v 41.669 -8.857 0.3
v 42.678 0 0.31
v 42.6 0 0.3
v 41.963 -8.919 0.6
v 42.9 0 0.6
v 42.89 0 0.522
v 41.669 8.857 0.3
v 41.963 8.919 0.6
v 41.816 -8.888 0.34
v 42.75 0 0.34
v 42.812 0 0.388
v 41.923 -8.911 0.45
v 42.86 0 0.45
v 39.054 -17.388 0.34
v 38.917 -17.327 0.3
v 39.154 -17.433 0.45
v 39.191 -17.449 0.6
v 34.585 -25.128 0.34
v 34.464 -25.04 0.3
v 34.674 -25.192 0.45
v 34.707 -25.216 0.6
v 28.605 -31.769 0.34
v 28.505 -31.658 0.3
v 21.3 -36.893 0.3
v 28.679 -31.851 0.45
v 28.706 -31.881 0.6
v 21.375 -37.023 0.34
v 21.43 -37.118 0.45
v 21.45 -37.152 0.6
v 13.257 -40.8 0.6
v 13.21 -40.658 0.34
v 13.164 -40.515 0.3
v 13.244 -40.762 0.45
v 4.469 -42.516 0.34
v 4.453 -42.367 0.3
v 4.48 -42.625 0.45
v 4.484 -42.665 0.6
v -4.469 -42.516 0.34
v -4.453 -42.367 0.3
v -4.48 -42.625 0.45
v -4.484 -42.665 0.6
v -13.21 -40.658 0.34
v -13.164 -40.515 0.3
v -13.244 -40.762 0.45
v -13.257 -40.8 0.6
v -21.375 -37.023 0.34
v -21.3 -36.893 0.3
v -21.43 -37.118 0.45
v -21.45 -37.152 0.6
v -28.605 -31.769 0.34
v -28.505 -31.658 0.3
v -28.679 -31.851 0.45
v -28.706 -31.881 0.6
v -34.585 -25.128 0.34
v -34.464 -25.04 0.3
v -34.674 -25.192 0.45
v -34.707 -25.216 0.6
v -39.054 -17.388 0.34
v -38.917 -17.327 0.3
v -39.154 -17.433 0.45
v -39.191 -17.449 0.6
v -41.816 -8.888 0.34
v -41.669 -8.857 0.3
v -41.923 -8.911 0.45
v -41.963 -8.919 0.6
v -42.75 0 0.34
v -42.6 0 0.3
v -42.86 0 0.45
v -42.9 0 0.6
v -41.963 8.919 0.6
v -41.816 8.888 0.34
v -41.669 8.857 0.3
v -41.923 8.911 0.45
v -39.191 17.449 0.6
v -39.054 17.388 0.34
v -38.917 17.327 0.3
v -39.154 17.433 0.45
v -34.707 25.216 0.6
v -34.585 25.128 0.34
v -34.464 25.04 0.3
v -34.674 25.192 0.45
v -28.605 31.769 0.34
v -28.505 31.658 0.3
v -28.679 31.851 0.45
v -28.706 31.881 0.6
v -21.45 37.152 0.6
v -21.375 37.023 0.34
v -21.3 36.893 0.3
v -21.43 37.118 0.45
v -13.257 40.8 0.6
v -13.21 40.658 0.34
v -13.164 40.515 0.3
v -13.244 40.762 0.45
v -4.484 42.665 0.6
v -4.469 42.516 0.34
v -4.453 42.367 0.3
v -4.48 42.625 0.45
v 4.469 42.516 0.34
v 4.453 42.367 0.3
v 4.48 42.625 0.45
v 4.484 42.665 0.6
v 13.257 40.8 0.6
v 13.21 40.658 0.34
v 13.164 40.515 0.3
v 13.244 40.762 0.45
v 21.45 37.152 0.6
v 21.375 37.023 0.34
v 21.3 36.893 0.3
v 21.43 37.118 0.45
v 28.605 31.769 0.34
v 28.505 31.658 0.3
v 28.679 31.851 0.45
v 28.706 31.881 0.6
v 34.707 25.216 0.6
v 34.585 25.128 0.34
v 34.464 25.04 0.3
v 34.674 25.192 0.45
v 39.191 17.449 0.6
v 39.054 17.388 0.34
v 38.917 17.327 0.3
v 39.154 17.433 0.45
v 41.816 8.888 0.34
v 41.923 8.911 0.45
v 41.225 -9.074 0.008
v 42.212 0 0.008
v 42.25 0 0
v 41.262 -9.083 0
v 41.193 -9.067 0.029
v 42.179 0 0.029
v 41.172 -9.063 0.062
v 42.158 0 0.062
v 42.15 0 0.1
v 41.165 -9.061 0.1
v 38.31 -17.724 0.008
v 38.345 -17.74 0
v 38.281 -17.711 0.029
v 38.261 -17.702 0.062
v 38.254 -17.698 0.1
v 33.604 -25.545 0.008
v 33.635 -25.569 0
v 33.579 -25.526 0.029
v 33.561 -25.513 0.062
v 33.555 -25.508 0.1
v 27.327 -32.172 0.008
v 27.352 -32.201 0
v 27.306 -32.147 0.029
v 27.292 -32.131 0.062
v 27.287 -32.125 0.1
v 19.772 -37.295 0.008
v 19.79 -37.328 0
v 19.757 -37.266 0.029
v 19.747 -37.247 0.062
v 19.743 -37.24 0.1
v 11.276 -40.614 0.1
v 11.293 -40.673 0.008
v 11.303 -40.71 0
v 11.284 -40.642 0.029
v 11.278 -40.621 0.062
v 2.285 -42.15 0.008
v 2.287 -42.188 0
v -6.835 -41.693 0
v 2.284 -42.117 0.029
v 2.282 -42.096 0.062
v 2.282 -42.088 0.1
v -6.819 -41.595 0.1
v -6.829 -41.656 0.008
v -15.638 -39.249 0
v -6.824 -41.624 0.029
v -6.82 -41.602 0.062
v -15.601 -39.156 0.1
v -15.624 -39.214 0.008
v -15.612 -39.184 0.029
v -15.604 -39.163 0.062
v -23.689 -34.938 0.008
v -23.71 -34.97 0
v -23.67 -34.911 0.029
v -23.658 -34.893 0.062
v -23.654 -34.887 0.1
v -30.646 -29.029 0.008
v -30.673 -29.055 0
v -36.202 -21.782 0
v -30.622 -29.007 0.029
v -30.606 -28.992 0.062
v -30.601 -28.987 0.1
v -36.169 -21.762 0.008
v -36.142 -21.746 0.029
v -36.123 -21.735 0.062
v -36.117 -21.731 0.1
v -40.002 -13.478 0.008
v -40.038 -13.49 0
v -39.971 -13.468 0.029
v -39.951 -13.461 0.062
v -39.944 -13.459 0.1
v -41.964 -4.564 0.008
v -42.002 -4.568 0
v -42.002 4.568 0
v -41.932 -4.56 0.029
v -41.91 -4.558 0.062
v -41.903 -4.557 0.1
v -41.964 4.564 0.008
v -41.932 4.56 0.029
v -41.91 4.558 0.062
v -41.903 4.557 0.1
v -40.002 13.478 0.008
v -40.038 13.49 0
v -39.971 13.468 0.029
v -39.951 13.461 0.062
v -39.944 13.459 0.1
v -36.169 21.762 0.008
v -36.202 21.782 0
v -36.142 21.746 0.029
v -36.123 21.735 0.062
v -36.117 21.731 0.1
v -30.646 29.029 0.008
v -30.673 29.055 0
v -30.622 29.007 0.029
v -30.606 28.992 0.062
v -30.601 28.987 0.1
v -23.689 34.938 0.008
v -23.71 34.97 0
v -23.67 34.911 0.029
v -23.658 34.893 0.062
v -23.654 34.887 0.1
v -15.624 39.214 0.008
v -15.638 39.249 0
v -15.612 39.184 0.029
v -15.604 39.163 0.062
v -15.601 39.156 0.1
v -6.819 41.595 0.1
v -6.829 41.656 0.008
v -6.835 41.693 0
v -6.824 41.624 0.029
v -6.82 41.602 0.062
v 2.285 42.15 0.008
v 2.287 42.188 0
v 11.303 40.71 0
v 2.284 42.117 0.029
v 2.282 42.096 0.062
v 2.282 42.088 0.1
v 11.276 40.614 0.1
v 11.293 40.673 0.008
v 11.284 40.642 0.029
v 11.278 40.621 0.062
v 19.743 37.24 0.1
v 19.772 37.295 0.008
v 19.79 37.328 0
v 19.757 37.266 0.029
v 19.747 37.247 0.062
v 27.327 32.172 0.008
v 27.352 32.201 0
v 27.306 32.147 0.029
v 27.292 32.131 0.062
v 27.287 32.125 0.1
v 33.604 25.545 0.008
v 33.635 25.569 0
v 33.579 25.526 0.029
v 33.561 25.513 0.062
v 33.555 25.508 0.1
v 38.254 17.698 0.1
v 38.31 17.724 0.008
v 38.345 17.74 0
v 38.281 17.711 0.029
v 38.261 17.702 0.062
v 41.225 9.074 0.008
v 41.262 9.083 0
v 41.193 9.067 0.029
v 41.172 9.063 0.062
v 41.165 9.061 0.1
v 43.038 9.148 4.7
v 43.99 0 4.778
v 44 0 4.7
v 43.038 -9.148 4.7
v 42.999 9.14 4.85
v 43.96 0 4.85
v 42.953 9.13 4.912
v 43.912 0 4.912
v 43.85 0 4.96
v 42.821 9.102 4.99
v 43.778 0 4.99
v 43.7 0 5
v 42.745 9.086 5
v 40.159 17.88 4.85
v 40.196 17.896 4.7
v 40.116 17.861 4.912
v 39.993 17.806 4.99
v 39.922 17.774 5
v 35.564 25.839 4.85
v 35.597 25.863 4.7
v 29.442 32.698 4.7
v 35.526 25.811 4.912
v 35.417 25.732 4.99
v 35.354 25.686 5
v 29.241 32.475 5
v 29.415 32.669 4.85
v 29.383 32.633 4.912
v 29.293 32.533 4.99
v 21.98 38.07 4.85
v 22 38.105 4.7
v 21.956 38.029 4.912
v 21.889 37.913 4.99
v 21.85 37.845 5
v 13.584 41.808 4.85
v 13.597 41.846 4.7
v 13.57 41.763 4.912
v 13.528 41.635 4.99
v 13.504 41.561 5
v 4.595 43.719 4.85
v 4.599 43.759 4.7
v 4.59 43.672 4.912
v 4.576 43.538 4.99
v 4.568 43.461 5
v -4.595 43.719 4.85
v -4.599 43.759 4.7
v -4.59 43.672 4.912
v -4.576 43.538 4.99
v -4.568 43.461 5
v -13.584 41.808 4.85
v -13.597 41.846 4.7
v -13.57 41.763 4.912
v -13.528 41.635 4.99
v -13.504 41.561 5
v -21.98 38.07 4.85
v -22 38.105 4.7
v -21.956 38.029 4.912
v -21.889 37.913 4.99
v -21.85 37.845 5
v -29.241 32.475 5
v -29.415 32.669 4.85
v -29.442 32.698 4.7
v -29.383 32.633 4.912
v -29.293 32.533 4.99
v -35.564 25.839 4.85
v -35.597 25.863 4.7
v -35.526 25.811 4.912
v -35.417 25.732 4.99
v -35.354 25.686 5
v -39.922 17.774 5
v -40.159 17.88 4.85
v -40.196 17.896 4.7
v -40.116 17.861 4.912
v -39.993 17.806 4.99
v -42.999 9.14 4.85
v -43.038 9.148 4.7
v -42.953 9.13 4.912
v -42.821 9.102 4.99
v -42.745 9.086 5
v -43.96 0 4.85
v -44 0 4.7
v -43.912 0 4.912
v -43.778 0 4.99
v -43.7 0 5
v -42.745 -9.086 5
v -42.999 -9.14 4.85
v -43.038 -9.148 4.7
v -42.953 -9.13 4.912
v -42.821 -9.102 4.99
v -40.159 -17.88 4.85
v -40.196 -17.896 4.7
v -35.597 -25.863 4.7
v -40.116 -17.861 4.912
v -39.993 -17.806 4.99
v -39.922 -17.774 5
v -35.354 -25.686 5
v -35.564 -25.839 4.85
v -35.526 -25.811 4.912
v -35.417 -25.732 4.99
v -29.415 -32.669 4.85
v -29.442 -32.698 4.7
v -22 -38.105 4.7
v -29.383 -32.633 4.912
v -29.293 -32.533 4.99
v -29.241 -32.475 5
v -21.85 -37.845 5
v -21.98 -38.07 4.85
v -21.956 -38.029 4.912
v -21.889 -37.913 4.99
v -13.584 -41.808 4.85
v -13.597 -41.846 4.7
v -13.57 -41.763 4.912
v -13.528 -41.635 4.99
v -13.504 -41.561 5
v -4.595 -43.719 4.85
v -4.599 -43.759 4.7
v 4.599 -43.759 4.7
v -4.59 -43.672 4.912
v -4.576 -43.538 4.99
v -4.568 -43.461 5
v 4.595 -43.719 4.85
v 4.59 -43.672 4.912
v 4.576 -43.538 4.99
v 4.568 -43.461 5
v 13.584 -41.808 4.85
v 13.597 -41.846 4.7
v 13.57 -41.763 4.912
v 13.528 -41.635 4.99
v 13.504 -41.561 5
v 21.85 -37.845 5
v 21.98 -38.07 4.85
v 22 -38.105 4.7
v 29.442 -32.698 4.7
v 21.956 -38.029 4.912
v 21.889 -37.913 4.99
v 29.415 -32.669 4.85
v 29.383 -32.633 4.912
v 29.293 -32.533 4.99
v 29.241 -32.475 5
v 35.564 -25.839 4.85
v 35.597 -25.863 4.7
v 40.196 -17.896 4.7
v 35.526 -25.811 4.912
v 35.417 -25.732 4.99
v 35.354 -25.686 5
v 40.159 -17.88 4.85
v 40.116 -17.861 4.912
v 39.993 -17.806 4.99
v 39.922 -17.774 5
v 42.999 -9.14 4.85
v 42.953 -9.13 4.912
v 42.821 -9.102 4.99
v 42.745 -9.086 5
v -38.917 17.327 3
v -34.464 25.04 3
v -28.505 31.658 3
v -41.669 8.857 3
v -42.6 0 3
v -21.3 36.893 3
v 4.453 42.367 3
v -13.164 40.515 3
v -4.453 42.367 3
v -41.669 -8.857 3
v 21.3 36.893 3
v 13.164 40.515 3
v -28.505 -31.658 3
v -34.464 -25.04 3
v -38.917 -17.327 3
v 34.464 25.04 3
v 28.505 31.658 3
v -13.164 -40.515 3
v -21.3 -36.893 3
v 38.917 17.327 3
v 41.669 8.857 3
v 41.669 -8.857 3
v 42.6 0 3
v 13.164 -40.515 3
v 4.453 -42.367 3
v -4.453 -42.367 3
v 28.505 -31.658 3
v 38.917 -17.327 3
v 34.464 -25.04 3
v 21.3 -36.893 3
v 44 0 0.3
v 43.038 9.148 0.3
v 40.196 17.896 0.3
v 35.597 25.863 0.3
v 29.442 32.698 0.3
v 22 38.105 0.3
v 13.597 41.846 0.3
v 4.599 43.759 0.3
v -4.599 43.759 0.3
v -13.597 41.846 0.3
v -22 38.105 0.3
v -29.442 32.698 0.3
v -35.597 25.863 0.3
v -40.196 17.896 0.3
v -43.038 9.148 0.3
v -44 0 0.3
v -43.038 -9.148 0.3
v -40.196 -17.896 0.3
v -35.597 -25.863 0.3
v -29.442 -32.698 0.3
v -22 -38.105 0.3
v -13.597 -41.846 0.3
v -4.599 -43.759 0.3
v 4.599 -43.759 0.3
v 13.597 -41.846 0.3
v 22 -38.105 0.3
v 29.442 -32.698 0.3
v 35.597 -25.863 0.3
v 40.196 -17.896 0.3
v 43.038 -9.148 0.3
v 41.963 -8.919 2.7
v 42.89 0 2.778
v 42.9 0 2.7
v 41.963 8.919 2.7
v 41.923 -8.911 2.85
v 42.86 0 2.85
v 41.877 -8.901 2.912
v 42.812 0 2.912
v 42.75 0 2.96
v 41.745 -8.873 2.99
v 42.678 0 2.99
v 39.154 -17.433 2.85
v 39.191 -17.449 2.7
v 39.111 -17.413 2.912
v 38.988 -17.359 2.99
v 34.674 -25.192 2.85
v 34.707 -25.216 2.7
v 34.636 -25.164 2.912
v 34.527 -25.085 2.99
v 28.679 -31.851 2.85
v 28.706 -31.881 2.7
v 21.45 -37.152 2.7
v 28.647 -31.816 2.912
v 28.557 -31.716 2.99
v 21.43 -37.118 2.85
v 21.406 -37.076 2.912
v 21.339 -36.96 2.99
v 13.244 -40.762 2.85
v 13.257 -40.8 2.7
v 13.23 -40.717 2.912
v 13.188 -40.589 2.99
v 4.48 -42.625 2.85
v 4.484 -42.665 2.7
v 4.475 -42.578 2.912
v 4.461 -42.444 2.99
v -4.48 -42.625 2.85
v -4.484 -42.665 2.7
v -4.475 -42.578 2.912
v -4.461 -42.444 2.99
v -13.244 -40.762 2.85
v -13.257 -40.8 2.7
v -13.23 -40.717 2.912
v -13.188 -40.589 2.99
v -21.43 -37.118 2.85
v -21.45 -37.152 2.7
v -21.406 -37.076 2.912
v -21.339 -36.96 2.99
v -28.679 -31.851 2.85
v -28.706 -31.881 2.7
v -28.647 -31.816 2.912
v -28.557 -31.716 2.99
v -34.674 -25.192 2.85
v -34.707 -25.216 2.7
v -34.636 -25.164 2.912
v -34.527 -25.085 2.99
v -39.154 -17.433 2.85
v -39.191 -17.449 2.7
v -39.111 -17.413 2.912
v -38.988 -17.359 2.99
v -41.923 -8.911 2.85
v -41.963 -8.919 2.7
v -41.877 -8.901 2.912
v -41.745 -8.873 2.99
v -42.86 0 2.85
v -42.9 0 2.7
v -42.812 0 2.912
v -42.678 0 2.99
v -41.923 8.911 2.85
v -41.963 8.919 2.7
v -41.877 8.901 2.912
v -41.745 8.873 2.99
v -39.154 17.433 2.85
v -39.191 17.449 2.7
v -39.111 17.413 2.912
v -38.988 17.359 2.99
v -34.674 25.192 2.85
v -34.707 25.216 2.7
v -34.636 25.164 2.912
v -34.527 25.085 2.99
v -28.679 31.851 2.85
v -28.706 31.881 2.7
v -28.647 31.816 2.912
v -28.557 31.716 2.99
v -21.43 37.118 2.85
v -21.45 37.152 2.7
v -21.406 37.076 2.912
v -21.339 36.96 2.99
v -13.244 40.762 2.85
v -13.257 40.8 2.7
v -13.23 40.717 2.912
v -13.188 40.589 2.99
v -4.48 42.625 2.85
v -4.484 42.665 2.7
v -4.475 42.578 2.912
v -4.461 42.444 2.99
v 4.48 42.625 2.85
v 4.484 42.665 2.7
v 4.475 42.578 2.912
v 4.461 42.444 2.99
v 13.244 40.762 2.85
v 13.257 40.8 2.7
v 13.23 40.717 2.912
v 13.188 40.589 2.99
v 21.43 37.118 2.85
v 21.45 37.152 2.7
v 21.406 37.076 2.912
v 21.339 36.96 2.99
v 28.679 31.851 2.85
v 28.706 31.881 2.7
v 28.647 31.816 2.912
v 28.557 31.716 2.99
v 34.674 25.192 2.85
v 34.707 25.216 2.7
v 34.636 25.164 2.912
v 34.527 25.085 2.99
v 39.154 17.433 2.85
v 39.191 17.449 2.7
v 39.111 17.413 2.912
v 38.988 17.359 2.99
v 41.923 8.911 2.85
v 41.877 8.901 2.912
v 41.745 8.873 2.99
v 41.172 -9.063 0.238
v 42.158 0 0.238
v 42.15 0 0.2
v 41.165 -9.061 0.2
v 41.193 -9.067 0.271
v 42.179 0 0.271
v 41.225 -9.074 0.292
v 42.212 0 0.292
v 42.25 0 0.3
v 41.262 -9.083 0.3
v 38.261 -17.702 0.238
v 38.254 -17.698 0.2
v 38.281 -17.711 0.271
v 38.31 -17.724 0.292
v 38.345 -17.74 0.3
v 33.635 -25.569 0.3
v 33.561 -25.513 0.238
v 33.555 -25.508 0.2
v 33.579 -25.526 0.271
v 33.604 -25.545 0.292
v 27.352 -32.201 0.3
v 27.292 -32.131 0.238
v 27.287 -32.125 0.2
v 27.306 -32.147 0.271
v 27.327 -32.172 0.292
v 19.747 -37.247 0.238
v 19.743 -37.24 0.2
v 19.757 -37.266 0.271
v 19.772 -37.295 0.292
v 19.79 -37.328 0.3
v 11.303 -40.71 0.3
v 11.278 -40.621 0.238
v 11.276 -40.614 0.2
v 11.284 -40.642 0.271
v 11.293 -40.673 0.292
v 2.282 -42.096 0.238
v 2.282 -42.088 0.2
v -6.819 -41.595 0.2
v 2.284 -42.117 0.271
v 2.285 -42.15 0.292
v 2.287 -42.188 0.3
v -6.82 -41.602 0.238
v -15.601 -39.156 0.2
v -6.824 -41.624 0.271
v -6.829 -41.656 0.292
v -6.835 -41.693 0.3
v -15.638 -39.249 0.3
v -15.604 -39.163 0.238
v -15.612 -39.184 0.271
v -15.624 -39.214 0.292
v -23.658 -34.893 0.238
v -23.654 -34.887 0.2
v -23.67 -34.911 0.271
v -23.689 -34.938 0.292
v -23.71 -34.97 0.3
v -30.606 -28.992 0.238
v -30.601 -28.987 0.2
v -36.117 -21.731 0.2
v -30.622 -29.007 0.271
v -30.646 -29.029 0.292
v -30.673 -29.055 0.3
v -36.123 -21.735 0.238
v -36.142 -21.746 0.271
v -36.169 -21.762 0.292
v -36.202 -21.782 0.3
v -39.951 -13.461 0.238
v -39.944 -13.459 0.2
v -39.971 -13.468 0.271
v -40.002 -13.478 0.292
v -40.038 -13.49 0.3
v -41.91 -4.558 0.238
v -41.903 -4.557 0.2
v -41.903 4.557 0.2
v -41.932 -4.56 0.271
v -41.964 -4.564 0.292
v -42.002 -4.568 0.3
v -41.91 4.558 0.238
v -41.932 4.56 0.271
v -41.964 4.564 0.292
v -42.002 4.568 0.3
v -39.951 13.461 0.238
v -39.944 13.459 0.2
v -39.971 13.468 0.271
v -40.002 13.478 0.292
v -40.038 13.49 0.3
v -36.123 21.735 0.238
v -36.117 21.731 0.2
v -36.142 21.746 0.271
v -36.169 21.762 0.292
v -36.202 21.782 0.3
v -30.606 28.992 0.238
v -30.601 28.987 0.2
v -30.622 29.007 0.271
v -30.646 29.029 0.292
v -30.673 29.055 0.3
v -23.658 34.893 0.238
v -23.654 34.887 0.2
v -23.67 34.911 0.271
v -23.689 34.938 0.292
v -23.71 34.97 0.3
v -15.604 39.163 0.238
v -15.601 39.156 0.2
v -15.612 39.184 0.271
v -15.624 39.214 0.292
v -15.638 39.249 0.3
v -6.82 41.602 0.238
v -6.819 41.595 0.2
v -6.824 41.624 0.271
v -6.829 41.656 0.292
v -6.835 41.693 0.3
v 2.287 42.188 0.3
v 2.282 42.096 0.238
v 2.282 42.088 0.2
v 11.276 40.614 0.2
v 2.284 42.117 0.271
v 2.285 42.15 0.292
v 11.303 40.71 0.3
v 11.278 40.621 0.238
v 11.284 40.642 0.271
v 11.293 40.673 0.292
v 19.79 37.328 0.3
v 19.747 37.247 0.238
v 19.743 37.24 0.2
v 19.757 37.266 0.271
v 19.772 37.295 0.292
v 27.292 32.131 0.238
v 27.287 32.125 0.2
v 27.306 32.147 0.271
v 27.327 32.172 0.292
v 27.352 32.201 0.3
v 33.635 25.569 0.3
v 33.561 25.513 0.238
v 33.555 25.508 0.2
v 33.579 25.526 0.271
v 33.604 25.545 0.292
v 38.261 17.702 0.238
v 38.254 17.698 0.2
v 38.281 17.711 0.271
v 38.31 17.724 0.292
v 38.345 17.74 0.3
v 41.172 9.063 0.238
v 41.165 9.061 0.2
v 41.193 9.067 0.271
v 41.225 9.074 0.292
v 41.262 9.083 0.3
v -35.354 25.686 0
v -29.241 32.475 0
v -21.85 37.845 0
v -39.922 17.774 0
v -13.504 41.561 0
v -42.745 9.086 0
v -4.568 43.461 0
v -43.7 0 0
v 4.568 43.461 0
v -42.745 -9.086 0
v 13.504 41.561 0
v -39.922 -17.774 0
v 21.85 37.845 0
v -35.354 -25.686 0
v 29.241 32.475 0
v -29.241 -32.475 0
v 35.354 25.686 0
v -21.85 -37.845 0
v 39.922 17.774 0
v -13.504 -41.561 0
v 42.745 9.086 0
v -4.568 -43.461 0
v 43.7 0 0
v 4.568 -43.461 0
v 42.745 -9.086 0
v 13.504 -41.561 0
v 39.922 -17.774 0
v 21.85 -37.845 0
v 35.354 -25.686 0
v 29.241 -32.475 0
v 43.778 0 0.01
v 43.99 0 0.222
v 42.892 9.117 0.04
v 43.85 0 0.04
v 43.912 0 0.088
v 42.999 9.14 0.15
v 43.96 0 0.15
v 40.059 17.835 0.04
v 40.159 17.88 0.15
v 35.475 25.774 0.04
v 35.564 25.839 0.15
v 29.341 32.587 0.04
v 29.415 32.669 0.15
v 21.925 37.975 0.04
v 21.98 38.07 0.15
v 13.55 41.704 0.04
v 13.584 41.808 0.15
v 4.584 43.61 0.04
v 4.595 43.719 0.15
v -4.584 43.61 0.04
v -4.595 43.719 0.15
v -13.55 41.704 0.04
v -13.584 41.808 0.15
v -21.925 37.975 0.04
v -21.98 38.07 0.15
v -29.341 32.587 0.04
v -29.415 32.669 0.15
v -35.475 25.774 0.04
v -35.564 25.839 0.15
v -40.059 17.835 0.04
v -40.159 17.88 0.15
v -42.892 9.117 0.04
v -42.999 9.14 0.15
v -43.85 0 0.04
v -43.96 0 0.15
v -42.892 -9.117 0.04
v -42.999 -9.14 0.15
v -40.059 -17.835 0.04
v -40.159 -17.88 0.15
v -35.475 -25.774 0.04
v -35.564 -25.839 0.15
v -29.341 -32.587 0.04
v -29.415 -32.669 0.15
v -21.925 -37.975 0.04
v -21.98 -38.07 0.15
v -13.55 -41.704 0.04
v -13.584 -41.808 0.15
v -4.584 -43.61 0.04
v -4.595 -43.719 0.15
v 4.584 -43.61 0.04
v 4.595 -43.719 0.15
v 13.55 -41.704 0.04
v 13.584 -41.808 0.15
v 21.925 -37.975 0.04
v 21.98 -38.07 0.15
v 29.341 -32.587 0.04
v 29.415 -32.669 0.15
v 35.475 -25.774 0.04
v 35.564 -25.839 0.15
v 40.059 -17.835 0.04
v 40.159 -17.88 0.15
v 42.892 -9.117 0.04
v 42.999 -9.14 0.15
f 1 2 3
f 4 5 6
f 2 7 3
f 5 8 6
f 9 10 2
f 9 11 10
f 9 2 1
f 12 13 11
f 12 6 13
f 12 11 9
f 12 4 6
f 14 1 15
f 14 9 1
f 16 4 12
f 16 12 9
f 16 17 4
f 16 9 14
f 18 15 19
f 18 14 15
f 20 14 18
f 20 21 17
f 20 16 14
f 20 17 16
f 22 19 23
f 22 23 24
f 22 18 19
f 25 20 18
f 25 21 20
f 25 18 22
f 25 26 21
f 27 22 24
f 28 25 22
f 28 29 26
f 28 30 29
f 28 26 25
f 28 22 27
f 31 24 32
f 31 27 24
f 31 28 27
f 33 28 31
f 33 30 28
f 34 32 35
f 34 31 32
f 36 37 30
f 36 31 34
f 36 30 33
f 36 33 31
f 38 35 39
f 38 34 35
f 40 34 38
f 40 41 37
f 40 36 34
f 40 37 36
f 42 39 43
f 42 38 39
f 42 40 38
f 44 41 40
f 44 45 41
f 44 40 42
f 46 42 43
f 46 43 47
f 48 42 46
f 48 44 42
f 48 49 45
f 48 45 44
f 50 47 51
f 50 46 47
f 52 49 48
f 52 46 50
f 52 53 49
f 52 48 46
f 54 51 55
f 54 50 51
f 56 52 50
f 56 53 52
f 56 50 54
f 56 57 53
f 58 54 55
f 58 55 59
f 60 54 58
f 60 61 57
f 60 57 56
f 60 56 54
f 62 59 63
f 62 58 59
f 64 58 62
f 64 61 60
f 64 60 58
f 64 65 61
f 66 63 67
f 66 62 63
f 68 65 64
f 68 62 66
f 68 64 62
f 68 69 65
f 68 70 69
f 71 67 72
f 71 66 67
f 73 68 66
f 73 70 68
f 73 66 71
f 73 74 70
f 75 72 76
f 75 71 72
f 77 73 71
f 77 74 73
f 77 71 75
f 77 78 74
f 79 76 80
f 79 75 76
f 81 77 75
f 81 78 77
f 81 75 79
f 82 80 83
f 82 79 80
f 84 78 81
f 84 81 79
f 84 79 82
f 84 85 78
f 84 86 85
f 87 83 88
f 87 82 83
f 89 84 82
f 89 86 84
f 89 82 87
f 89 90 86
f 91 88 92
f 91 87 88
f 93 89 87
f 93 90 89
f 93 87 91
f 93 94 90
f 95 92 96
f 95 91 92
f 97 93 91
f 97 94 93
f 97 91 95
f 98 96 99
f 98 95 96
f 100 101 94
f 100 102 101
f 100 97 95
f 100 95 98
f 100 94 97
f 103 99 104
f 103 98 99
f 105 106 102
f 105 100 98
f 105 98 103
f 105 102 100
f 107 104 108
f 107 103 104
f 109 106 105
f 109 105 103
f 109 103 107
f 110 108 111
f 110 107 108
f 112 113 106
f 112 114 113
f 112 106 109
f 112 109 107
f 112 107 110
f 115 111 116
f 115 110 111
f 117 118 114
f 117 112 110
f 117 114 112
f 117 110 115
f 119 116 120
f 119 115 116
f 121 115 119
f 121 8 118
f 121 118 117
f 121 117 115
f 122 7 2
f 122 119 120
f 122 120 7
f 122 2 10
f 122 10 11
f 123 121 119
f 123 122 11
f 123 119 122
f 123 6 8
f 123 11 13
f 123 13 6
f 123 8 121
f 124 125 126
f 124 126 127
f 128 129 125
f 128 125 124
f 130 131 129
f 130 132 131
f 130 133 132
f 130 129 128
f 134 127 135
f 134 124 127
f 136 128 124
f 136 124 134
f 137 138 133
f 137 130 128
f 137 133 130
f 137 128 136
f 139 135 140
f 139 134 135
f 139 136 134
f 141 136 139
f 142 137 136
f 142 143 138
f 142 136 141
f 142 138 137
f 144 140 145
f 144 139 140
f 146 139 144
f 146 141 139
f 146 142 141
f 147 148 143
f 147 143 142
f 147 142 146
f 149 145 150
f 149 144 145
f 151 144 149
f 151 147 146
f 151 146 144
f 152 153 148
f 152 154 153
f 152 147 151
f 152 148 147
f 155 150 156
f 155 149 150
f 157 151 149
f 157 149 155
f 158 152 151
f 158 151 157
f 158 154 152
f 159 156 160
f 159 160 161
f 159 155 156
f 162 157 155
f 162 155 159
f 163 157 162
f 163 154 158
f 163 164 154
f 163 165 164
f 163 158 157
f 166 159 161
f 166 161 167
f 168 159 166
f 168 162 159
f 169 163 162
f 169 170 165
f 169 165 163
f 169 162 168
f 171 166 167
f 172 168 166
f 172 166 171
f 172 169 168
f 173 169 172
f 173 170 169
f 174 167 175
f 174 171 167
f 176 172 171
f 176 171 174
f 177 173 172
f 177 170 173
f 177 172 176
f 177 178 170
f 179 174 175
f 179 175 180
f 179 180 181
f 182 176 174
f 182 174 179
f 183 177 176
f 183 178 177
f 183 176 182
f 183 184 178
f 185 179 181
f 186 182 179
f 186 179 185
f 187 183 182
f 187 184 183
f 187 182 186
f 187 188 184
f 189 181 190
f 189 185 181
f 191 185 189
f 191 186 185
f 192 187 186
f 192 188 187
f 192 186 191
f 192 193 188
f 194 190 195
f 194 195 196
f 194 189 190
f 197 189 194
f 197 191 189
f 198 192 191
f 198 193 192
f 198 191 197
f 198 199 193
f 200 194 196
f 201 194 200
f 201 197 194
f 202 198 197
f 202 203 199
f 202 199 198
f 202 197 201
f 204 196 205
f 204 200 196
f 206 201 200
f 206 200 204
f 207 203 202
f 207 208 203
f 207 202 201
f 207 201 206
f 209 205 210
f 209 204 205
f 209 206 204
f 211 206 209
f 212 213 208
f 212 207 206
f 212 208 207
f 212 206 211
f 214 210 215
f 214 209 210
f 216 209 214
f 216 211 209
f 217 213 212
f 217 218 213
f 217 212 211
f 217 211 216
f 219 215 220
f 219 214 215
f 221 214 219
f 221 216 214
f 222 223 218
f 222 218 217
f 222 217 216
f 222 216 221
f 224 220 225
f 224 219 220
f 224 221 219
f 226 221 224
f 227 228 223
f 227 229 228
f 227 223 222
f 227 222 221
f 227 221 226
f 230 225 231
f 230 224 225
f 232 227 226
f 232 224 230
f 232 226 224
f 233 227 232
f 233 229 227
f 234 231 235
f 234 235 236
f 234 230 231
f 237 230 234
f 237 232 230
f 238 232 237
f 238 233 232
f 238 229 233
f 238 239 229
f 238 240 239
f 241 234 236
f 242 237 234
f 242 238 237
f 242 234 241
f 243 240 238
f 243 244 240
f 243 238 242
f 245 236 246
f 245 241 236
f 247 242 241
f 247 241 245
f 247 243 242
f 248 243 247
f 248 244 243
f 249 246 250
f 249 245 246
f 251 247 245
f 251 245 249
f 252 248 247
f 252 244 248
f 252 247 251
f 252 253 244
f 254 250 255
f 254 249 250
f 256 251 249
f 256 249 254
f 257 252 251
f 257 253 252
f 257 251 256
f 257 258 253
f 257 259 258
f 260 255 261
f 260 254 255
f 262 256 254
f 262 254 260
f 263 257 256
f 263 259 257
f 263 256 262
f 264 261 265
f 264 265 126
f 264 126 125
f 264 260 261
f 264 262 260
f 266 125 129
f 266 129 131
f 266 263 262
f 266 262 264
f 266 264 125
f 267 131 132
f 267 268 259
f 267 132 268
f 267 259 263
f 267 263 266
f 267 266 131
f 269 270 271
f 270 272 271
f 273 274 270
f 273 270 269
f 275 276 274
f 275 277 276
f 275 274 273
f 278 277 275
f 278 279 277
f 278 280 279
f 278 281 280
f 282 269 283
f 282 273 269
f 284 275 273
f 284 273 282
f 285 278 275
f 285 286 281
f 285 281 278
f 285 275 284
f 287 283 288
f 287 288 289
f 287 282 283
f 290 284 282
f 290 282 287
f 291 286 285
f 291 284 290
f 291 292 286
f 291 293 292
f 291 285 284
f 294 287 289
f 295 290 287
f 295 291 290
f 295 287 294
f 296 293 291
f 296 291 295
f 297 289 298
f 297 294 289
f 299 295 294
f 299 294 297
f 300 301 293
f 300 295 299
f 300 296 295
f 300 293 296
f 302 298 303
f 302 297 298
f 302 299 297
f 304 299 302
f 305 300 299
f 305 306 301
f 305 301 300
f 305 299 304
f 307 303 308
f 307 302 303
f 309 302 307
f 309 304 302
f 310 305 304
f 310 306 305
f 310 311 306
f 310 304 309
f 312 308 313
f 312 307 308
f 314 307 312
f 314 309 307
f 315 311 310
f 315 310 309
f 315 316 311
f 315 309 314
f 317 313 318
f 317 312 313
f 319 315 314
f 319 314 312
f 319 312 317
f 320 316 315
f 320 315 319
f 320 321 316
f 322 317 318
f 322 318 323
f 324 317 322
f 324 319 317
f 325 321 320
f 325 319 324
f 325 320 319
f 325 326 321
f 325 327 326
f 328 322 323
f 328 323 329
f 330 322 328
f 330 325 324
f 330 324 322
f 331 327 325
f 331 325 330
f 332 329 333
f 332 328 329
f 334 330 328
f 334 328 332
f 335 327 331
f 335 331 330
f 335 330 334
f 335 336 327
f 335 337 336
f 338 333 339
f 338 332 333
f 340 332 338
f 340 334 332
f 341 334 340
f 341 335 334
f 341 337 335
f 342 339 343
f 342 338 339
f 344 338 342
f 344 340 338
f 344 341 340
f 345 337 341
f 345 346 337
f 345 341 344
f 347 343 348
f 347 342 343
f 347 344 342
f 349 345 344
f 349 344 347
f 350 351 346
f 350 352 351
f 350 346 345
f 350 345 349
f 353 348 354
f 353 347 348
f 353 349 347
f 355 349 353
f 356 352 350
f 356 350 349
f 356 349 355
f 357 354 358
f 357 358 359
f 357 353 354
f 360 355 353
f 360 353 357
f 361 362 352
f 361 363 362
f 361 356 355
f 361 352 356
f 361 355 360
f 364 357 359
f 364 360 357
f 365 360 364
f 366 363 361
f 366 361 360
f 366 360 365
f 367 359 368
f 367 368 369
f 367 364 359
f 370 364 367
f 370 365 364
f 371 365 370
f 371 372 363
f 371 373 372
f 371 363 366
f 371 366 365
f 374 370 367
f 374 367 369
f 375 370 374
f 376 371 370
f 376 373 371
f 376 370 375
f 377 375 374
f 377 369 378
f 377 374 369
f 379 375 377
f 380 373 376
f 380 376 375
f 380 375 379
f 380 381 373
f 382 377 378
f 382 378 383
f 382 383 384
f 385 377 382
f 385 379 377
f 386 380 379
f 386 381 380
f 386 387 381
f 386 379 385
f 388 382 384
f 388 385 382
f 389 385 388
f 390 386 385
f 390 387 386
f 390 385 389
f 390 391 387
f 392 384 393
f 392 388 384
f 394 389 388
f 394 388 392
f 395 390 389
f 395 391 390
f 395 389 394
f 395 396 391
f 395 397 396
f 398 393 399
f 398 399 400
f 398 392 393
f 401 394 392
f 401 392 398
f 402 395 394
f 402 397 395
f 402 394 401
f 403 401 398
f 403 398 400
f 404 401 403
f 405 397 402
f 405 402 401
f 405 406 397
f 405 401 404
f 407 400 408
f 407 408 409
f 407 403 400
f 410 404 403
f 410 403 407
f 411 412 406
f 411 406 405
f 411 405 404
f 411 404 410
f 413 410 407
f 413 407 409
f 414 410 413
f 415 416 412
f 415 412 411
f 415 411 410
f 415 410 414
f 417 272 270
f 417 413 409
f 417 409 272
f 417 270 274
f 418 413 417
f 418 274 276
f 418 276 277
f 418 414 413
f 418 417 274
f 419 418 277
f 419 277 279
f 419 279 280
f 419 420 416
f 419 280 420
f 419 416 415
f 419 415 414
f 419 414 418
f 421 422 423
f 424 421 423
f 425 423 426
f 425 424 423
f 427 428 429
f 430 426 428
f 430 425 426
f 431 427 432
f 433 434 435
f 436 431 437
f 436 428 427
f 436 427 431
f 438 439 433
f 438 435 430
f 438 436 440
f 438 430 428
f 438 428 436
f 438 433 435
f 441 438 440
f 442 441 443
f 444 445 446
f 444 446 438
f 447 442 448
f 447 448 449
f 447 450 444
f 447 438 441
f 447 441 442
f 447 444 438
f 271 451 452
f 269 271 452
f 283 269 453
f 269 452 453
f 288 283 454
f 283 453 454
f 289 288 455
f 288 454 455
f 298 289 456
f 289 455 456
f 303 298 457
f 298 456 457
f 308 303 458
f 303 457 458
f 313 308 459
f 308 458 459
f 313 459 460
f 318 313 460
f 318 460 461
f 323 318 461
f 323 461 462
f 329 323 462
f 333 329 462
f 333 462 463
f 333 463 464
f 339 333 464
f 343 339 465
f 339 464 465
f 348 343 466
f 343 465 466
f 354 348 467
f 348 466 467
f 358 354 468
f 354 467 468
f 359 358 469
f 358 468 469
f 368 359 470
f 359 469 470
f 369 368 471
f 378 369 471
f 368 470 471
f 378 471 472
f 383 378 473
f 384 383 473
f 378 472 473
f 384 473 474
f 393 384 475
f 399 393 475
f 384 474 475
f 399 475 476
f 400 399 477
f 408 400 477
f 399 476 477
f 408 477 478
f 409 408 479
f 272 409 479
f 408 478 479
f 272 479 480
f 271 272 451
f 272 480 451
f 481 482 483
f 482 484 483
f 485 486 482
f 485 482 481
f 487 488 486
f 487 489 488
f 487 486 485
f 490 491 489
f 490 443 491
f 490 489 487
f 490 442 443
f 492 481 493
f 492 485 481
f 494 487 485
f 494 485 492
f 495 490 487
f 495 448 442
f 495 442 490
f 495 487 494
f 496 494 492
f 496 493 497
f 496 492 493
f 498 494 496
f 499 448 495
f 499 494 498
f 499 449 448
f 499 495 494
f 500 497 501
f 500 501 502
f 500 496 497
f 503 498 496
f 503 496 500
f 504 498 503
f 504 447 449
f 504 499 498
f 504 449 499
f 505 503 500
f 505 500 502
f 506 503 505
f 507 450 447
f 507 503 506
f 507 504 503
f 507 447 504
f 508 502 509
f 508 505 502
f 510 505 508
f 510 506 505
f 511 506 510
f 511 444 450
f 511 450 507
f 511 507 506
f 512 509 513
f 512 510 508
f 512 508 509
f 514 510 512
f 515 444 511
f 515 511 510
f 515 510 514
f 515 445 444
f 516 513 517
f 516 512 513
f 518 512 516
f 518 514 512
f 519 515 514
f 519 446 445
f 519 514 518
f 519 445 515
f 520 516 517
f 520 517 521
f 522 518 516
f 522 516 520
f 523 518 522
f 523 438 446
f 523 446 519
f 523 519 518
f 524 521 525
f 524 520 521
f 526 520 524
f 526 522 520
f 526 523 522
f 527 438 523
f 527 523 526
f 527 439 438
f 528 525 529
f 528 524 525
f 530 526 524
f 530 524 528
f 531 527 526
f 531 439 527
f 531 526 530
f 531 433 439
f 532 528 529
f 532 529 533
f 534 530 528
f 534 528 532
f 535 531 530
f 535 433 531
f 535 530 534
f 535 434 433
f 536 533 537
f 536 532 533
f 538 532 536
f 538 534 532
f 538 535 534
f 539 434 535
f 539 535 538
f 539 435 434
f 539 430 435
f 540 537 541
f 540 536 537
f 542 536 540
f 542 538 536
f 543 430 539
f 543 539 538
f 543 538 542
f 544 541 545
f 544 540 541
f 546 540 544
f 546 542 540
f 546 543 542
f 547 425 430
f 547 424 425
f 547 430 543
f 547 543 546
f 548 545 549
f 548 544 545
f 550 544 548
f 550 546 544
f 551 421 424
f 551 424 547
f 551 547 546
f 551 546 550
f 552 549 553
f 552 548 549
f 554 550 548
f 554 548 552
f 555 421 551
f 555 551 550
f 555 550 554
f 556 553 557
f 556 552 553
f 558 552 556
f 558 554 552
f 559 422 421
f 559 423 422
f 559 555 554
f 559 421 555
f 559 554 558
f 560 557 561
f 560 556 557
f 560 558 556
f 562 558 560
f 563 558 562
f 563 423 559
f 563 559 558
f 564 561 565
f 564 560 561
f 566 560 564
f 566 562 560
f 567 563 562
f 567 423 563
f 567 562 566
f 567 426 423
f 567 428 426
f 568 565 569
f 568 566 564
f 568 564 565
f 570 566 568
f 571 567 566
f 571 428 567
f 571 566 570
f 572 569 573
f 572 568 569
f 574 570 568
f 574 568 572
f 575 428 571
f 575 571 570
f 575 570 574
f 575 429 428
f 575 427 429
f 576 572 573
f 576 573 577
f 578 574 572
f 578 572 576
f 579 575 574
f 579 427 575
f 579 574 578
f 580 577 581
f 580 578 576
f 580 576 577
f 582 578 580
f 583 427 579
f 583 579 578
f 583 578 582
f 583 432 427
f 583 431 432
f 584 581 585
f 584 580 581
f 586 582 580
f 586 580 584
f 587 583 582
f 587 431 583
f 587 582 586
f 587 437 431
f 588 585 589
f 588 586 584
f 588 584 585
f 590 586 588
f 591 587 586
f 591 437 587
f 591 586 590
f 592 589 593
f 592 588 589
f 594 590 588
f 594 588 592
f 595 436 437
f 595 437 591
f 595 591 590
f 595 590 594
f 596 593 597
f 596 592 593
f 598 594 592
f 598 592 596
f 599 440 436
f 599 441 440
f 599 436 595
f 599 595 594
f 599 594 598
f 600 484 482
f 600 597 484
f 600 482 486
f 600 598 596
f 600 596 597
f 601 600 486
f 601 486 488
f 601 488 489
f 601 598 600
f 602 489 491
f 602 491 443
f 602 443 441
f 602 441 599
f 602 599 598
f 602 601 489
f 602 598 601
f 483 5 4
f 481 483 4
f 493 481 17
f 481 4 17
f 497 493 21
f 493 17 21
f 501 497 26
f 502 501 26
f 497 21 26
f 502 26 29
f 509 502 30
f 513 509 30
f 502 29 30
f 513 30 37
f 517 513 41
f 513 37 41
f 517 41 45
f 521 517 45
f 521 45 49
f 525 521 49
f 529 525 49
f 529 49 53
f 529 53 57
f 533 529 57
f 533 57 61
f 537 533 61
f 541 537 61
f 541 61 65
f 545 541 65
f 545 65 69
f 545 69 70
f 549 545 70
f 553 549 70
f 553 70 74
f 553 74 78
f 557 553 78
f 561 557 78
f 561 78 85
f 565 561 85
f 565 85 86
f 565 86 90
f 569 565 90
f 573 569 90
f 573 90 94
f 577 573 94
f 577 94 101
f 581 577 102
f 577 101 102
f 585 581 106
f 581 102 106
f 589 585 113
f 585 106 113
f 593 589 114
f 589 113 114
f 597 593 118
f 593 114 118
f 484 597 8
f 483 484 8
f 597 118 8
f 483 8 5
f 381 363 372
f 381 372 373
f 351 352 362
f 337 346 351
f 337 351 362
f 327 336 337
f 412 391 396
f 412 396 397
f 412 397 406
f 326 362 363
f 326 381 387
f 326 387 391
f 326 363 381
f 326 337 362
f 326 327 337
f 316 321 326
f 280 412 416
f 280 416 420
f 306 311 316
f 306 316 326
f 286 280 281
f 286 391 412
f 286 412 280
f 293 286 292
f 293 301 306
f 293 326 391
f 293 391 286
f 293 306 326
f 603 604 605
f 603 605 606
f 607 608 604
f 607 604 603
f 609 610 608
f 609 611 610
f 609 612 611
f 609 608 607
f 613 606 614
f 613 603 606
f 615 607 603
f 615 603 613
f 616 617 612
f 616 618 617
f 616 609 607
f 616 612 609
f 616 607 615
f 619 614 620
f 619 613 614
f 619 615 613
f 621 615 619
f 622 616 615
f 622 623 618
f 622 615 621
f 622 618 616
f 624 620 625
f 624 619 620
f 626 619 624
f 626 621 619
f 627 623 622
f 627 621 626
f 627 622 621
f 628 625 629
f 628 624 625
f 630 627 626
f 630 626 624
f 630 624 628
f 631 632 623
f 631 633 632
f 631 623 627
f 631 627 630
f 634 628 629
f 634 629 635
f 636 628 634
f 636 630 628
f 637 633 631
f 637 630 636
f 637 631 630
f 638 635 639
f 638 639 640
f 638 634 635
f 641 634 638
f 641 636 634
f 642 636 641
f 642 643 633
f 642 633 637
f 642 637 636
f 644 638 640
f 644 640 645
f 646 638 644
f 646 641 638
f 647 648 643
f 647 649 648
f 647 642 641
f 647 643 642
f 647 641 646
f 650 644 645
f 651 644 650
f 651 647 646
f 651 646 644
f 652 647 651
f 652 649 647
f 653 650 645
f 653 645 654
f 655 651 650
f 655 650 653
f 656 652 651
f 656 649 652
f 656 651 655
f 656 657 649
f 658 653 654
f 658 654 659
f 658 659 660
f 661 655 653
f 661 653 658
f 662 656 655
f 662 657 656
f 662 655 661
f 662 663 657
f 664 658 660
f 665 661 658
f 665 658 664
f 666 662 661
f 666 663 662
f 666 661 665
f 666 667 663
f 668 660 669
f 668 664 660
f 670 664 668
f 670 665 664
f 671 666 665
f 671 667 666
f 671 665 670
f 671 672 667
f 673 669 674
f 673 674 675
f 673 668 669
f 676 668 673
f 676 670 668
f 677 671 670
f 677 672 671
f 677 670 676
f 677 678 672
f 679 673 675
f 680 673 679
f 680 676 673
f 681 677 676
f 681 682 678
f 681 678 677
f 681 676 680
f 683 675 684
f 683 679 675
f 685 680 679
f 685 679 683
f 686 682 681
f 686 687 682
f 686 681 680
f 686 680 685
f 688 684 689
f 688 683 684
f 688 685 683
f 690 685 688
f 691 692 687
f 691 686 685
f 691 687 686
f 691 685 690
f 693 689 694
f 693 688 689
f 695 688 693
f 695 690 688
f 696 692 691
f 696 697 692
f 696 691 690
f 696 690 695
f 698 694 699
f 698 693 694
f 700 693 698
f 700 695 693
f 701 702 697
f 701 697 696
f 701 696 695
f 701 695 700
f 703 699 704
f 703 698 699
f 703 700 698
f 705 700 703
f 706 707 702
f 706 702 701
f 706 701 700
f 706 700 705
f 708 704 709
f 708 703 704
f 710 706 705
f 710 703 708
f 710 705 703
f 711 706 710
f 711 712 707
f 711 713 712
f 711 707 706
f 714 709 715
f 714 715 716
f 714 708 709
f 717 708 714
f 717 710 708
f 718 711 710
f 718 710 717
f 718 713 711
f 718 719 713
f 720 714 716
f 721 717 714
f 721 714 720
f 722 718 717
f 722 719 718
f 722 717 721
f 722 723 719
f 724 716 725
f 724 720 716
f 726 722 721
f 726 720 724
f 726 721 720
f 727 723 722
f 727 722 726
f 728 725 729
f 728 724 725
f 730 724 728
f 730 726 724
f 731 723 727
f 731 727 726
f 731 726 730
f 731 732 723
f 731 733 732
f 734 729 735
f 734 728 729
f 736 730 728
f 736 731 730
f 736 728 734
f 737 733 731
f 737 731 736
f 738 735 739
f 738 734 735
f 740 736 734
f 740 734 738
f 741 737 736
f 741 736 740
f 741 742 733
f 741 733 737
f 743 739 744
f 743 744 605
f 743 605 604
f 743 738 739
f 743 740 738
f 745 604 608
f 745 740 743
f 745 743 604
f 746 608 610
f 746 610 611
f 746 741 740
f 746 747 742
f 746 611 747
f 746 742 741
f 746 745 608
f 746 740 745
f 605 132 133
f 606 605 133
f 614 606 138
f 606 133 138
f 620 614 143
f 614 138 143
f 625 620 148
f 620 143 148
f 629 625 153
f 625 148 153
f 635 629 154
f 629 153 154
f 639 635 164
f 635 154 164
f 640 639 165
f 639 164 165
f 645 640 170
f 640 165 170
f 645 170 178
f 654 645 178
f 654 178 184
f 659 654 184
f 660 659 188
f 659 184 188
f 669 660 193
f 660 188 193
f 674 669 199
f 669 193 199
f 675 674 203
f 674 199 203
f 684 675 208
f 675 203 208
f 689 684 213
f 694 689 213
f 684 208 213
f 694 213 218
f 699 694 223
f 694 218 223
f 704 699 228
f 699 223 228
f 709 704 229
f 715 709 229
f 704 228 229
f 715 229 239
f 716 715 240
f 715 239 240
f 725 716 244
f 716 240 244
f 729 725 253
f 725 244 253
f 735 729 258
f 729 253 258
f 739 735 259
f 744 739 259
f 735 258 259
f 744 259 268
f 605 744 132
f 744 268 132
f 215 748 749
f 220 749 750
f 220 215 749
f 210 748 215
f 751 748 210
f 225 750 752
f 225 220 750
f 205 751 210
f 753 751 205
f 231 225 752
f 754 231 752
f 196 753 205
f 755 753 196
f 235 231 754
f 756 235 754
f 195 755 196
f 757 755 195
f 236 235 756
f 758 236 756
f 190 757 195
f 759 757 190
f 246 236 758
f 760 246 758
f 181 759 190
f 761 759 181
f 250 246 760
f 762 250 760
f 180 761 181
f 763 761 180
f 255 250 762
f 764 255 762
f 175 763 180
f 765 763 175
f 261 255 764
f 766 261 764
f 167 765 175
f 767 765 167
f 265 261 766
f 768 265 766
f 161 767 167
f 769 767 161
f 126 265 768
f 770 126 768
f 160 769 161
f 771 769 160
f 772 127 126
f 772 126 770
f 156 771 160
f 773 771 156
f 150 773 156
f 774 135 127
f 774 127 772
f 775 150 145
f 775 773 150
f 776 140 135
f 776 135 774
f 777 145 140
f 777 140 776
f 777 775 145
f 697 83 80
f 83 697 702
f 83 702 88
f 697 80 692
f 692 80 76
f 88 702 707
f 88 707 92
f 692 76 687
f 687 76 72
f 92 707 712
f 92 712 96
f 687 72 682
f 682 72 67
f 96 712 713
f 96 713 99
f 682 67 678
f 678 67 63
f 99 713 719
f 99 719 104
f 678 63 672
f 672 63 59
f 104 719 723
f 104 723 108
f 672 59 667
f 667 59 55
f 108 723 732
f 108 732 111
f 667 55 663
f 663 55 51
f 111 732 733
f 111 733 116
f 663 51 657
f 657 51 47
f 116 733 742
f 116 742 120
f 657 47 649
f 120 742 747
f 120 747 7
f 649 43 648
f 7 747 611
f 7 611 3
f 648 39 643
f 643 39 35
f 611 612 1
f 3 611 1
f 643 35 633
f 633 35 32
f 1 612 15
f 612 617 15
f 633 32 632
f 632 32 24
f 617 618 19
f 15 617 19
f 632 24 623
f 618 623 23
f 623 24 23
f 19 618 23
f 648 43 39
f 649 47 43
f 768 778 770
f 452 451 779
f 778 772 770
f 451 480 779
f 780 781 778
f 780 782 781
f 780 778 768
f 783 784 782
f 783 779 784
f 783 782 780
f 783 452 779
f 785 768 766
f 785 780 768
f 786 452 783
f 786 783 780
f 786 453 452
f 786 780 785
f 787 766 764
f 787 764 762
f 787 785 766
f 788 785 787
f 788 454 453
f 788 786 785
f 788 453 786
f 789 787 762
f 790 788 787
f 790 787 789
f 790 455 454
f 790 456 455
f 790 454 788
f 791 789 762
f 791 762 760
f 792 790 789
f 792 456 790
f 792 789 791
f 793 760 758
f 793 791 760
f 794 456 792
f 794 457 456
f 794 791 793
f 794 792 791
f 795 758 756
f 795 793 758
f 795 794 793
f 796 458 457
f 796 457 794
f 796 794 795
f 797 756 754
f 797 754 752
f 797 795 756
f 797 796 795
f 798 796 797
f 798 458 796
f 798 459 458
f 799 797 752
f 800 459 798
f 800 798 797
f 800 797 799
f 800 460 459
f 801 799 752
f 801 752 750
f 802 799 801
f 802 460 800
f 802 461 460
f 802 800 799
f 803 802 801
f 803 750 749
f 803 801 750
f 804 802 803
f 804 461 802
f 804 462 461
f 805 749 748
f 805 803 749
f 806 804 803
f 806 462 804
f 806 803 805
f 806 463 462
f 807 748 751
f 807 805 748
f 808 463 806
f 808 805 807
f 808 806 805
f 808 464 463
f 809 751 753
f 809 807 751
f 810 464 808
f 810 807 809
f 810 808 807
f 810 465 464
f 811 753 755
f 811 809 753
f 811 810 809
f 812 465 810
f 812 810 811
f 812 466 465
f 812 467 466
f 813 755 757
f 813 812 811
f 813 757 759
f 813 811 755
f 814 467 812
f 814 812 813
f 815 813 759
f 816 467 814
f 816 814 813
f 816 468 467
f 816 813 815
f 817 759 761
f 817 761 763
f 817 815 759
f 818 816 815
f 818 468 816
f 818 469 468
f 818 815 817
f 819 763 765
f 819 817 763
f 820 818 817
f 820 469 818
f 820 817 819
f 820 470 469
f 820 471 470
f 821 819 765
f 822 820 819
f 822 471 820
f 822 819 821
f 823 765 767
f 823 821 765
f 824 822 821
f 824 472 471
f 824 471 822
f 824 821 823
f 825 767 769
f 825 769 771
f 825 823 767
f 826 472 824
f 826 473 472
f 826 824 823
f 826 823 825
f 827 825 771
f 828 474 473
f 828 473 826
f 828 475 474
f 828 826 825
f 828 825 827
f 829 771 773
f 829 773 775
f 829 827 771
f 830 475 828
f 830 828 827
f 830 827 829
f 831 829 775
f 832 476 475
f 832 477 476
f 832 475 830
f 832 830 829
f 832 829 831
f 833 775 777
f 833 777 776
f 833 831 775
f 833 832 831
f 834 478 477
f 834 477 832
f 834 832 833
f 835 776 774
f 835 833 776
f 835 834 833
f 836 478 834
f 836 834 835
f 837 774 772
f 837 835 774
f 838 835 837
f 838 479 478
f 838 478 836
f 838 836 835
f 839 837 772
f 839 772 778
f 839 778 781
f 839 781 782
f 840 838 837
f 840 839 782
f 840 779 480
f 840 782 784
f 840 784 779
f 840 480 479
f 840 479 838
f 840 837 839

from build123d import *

# Parameters (mm, degrees)
F0_R     = 44
F0_R_2   = 42.9
F0_R_3   = 42.25
F1_DEPTH = 5
F2_R     = 42.9
F3_DEPTH = 3
F4_R     = 42.9
F4_R_2   = 42.15
F5_DEPTH = 0.3
F6_R     = 0.3
F7_R     = 0.1


with BuildPart() as f1:
    # F0 (on Top) → F1 (new body)
    with BuildSketch(Plane.XY):
        Circle(F0_R)
        Circle(F0_R_2, mode=Mode.SUBTRACT)
        Circle(F0_R_2)
        Circle(F0_R_3, mode=Mode.SUBTRACT)
        Circle(F0_R_3)
    extrude(amount=F1_DEPTH)

    # F2 (on face) → F3 (cut)
    with BuildSketch(Plane(origin=(0, 0, 0), x_dir=(1, 0, 0), z_dir=(0, 0, -1))):
        Circle(F2_R)
    extrude(amount=-F3_DEPTH, mode=Mode.SUBTRACT)

    # F4 (on face) → F5 (join)
    with BuildSketch(Plane(origin=(0, 0, 0), x_dir=(1, 0, 0), z_dir=(0, 0, -1))):
        Circle(F4_R)
        Circle(F4_R_2, mode=Mode.SUBTRACT)
    extrude(amount=-F5_DEPTH)

    # F6
    f6_edges = [f1.edges().sort_by_distance(p)[0] for p in [
        (-42.9, 0, 0.3),
        (42.9, 0, 1.65),
        (-42.9, 0, 3),
        (44, 0, 2.5),
        (-44, 0, 0),
        (-44, 0, 5),
    ]]
    fillet(f6_edges, radius=F6_R)

    # F7
    f7_edges = [f1.edges().sort_by_distance(p)[0] for p in [
        (42.15, 0, 0.15),
        (-42.15, 0, 0),
        (-42.15, 0, 0.3),
    ]]
    fillet(f7_edges, radius=F7_R)


solid = f1.part
